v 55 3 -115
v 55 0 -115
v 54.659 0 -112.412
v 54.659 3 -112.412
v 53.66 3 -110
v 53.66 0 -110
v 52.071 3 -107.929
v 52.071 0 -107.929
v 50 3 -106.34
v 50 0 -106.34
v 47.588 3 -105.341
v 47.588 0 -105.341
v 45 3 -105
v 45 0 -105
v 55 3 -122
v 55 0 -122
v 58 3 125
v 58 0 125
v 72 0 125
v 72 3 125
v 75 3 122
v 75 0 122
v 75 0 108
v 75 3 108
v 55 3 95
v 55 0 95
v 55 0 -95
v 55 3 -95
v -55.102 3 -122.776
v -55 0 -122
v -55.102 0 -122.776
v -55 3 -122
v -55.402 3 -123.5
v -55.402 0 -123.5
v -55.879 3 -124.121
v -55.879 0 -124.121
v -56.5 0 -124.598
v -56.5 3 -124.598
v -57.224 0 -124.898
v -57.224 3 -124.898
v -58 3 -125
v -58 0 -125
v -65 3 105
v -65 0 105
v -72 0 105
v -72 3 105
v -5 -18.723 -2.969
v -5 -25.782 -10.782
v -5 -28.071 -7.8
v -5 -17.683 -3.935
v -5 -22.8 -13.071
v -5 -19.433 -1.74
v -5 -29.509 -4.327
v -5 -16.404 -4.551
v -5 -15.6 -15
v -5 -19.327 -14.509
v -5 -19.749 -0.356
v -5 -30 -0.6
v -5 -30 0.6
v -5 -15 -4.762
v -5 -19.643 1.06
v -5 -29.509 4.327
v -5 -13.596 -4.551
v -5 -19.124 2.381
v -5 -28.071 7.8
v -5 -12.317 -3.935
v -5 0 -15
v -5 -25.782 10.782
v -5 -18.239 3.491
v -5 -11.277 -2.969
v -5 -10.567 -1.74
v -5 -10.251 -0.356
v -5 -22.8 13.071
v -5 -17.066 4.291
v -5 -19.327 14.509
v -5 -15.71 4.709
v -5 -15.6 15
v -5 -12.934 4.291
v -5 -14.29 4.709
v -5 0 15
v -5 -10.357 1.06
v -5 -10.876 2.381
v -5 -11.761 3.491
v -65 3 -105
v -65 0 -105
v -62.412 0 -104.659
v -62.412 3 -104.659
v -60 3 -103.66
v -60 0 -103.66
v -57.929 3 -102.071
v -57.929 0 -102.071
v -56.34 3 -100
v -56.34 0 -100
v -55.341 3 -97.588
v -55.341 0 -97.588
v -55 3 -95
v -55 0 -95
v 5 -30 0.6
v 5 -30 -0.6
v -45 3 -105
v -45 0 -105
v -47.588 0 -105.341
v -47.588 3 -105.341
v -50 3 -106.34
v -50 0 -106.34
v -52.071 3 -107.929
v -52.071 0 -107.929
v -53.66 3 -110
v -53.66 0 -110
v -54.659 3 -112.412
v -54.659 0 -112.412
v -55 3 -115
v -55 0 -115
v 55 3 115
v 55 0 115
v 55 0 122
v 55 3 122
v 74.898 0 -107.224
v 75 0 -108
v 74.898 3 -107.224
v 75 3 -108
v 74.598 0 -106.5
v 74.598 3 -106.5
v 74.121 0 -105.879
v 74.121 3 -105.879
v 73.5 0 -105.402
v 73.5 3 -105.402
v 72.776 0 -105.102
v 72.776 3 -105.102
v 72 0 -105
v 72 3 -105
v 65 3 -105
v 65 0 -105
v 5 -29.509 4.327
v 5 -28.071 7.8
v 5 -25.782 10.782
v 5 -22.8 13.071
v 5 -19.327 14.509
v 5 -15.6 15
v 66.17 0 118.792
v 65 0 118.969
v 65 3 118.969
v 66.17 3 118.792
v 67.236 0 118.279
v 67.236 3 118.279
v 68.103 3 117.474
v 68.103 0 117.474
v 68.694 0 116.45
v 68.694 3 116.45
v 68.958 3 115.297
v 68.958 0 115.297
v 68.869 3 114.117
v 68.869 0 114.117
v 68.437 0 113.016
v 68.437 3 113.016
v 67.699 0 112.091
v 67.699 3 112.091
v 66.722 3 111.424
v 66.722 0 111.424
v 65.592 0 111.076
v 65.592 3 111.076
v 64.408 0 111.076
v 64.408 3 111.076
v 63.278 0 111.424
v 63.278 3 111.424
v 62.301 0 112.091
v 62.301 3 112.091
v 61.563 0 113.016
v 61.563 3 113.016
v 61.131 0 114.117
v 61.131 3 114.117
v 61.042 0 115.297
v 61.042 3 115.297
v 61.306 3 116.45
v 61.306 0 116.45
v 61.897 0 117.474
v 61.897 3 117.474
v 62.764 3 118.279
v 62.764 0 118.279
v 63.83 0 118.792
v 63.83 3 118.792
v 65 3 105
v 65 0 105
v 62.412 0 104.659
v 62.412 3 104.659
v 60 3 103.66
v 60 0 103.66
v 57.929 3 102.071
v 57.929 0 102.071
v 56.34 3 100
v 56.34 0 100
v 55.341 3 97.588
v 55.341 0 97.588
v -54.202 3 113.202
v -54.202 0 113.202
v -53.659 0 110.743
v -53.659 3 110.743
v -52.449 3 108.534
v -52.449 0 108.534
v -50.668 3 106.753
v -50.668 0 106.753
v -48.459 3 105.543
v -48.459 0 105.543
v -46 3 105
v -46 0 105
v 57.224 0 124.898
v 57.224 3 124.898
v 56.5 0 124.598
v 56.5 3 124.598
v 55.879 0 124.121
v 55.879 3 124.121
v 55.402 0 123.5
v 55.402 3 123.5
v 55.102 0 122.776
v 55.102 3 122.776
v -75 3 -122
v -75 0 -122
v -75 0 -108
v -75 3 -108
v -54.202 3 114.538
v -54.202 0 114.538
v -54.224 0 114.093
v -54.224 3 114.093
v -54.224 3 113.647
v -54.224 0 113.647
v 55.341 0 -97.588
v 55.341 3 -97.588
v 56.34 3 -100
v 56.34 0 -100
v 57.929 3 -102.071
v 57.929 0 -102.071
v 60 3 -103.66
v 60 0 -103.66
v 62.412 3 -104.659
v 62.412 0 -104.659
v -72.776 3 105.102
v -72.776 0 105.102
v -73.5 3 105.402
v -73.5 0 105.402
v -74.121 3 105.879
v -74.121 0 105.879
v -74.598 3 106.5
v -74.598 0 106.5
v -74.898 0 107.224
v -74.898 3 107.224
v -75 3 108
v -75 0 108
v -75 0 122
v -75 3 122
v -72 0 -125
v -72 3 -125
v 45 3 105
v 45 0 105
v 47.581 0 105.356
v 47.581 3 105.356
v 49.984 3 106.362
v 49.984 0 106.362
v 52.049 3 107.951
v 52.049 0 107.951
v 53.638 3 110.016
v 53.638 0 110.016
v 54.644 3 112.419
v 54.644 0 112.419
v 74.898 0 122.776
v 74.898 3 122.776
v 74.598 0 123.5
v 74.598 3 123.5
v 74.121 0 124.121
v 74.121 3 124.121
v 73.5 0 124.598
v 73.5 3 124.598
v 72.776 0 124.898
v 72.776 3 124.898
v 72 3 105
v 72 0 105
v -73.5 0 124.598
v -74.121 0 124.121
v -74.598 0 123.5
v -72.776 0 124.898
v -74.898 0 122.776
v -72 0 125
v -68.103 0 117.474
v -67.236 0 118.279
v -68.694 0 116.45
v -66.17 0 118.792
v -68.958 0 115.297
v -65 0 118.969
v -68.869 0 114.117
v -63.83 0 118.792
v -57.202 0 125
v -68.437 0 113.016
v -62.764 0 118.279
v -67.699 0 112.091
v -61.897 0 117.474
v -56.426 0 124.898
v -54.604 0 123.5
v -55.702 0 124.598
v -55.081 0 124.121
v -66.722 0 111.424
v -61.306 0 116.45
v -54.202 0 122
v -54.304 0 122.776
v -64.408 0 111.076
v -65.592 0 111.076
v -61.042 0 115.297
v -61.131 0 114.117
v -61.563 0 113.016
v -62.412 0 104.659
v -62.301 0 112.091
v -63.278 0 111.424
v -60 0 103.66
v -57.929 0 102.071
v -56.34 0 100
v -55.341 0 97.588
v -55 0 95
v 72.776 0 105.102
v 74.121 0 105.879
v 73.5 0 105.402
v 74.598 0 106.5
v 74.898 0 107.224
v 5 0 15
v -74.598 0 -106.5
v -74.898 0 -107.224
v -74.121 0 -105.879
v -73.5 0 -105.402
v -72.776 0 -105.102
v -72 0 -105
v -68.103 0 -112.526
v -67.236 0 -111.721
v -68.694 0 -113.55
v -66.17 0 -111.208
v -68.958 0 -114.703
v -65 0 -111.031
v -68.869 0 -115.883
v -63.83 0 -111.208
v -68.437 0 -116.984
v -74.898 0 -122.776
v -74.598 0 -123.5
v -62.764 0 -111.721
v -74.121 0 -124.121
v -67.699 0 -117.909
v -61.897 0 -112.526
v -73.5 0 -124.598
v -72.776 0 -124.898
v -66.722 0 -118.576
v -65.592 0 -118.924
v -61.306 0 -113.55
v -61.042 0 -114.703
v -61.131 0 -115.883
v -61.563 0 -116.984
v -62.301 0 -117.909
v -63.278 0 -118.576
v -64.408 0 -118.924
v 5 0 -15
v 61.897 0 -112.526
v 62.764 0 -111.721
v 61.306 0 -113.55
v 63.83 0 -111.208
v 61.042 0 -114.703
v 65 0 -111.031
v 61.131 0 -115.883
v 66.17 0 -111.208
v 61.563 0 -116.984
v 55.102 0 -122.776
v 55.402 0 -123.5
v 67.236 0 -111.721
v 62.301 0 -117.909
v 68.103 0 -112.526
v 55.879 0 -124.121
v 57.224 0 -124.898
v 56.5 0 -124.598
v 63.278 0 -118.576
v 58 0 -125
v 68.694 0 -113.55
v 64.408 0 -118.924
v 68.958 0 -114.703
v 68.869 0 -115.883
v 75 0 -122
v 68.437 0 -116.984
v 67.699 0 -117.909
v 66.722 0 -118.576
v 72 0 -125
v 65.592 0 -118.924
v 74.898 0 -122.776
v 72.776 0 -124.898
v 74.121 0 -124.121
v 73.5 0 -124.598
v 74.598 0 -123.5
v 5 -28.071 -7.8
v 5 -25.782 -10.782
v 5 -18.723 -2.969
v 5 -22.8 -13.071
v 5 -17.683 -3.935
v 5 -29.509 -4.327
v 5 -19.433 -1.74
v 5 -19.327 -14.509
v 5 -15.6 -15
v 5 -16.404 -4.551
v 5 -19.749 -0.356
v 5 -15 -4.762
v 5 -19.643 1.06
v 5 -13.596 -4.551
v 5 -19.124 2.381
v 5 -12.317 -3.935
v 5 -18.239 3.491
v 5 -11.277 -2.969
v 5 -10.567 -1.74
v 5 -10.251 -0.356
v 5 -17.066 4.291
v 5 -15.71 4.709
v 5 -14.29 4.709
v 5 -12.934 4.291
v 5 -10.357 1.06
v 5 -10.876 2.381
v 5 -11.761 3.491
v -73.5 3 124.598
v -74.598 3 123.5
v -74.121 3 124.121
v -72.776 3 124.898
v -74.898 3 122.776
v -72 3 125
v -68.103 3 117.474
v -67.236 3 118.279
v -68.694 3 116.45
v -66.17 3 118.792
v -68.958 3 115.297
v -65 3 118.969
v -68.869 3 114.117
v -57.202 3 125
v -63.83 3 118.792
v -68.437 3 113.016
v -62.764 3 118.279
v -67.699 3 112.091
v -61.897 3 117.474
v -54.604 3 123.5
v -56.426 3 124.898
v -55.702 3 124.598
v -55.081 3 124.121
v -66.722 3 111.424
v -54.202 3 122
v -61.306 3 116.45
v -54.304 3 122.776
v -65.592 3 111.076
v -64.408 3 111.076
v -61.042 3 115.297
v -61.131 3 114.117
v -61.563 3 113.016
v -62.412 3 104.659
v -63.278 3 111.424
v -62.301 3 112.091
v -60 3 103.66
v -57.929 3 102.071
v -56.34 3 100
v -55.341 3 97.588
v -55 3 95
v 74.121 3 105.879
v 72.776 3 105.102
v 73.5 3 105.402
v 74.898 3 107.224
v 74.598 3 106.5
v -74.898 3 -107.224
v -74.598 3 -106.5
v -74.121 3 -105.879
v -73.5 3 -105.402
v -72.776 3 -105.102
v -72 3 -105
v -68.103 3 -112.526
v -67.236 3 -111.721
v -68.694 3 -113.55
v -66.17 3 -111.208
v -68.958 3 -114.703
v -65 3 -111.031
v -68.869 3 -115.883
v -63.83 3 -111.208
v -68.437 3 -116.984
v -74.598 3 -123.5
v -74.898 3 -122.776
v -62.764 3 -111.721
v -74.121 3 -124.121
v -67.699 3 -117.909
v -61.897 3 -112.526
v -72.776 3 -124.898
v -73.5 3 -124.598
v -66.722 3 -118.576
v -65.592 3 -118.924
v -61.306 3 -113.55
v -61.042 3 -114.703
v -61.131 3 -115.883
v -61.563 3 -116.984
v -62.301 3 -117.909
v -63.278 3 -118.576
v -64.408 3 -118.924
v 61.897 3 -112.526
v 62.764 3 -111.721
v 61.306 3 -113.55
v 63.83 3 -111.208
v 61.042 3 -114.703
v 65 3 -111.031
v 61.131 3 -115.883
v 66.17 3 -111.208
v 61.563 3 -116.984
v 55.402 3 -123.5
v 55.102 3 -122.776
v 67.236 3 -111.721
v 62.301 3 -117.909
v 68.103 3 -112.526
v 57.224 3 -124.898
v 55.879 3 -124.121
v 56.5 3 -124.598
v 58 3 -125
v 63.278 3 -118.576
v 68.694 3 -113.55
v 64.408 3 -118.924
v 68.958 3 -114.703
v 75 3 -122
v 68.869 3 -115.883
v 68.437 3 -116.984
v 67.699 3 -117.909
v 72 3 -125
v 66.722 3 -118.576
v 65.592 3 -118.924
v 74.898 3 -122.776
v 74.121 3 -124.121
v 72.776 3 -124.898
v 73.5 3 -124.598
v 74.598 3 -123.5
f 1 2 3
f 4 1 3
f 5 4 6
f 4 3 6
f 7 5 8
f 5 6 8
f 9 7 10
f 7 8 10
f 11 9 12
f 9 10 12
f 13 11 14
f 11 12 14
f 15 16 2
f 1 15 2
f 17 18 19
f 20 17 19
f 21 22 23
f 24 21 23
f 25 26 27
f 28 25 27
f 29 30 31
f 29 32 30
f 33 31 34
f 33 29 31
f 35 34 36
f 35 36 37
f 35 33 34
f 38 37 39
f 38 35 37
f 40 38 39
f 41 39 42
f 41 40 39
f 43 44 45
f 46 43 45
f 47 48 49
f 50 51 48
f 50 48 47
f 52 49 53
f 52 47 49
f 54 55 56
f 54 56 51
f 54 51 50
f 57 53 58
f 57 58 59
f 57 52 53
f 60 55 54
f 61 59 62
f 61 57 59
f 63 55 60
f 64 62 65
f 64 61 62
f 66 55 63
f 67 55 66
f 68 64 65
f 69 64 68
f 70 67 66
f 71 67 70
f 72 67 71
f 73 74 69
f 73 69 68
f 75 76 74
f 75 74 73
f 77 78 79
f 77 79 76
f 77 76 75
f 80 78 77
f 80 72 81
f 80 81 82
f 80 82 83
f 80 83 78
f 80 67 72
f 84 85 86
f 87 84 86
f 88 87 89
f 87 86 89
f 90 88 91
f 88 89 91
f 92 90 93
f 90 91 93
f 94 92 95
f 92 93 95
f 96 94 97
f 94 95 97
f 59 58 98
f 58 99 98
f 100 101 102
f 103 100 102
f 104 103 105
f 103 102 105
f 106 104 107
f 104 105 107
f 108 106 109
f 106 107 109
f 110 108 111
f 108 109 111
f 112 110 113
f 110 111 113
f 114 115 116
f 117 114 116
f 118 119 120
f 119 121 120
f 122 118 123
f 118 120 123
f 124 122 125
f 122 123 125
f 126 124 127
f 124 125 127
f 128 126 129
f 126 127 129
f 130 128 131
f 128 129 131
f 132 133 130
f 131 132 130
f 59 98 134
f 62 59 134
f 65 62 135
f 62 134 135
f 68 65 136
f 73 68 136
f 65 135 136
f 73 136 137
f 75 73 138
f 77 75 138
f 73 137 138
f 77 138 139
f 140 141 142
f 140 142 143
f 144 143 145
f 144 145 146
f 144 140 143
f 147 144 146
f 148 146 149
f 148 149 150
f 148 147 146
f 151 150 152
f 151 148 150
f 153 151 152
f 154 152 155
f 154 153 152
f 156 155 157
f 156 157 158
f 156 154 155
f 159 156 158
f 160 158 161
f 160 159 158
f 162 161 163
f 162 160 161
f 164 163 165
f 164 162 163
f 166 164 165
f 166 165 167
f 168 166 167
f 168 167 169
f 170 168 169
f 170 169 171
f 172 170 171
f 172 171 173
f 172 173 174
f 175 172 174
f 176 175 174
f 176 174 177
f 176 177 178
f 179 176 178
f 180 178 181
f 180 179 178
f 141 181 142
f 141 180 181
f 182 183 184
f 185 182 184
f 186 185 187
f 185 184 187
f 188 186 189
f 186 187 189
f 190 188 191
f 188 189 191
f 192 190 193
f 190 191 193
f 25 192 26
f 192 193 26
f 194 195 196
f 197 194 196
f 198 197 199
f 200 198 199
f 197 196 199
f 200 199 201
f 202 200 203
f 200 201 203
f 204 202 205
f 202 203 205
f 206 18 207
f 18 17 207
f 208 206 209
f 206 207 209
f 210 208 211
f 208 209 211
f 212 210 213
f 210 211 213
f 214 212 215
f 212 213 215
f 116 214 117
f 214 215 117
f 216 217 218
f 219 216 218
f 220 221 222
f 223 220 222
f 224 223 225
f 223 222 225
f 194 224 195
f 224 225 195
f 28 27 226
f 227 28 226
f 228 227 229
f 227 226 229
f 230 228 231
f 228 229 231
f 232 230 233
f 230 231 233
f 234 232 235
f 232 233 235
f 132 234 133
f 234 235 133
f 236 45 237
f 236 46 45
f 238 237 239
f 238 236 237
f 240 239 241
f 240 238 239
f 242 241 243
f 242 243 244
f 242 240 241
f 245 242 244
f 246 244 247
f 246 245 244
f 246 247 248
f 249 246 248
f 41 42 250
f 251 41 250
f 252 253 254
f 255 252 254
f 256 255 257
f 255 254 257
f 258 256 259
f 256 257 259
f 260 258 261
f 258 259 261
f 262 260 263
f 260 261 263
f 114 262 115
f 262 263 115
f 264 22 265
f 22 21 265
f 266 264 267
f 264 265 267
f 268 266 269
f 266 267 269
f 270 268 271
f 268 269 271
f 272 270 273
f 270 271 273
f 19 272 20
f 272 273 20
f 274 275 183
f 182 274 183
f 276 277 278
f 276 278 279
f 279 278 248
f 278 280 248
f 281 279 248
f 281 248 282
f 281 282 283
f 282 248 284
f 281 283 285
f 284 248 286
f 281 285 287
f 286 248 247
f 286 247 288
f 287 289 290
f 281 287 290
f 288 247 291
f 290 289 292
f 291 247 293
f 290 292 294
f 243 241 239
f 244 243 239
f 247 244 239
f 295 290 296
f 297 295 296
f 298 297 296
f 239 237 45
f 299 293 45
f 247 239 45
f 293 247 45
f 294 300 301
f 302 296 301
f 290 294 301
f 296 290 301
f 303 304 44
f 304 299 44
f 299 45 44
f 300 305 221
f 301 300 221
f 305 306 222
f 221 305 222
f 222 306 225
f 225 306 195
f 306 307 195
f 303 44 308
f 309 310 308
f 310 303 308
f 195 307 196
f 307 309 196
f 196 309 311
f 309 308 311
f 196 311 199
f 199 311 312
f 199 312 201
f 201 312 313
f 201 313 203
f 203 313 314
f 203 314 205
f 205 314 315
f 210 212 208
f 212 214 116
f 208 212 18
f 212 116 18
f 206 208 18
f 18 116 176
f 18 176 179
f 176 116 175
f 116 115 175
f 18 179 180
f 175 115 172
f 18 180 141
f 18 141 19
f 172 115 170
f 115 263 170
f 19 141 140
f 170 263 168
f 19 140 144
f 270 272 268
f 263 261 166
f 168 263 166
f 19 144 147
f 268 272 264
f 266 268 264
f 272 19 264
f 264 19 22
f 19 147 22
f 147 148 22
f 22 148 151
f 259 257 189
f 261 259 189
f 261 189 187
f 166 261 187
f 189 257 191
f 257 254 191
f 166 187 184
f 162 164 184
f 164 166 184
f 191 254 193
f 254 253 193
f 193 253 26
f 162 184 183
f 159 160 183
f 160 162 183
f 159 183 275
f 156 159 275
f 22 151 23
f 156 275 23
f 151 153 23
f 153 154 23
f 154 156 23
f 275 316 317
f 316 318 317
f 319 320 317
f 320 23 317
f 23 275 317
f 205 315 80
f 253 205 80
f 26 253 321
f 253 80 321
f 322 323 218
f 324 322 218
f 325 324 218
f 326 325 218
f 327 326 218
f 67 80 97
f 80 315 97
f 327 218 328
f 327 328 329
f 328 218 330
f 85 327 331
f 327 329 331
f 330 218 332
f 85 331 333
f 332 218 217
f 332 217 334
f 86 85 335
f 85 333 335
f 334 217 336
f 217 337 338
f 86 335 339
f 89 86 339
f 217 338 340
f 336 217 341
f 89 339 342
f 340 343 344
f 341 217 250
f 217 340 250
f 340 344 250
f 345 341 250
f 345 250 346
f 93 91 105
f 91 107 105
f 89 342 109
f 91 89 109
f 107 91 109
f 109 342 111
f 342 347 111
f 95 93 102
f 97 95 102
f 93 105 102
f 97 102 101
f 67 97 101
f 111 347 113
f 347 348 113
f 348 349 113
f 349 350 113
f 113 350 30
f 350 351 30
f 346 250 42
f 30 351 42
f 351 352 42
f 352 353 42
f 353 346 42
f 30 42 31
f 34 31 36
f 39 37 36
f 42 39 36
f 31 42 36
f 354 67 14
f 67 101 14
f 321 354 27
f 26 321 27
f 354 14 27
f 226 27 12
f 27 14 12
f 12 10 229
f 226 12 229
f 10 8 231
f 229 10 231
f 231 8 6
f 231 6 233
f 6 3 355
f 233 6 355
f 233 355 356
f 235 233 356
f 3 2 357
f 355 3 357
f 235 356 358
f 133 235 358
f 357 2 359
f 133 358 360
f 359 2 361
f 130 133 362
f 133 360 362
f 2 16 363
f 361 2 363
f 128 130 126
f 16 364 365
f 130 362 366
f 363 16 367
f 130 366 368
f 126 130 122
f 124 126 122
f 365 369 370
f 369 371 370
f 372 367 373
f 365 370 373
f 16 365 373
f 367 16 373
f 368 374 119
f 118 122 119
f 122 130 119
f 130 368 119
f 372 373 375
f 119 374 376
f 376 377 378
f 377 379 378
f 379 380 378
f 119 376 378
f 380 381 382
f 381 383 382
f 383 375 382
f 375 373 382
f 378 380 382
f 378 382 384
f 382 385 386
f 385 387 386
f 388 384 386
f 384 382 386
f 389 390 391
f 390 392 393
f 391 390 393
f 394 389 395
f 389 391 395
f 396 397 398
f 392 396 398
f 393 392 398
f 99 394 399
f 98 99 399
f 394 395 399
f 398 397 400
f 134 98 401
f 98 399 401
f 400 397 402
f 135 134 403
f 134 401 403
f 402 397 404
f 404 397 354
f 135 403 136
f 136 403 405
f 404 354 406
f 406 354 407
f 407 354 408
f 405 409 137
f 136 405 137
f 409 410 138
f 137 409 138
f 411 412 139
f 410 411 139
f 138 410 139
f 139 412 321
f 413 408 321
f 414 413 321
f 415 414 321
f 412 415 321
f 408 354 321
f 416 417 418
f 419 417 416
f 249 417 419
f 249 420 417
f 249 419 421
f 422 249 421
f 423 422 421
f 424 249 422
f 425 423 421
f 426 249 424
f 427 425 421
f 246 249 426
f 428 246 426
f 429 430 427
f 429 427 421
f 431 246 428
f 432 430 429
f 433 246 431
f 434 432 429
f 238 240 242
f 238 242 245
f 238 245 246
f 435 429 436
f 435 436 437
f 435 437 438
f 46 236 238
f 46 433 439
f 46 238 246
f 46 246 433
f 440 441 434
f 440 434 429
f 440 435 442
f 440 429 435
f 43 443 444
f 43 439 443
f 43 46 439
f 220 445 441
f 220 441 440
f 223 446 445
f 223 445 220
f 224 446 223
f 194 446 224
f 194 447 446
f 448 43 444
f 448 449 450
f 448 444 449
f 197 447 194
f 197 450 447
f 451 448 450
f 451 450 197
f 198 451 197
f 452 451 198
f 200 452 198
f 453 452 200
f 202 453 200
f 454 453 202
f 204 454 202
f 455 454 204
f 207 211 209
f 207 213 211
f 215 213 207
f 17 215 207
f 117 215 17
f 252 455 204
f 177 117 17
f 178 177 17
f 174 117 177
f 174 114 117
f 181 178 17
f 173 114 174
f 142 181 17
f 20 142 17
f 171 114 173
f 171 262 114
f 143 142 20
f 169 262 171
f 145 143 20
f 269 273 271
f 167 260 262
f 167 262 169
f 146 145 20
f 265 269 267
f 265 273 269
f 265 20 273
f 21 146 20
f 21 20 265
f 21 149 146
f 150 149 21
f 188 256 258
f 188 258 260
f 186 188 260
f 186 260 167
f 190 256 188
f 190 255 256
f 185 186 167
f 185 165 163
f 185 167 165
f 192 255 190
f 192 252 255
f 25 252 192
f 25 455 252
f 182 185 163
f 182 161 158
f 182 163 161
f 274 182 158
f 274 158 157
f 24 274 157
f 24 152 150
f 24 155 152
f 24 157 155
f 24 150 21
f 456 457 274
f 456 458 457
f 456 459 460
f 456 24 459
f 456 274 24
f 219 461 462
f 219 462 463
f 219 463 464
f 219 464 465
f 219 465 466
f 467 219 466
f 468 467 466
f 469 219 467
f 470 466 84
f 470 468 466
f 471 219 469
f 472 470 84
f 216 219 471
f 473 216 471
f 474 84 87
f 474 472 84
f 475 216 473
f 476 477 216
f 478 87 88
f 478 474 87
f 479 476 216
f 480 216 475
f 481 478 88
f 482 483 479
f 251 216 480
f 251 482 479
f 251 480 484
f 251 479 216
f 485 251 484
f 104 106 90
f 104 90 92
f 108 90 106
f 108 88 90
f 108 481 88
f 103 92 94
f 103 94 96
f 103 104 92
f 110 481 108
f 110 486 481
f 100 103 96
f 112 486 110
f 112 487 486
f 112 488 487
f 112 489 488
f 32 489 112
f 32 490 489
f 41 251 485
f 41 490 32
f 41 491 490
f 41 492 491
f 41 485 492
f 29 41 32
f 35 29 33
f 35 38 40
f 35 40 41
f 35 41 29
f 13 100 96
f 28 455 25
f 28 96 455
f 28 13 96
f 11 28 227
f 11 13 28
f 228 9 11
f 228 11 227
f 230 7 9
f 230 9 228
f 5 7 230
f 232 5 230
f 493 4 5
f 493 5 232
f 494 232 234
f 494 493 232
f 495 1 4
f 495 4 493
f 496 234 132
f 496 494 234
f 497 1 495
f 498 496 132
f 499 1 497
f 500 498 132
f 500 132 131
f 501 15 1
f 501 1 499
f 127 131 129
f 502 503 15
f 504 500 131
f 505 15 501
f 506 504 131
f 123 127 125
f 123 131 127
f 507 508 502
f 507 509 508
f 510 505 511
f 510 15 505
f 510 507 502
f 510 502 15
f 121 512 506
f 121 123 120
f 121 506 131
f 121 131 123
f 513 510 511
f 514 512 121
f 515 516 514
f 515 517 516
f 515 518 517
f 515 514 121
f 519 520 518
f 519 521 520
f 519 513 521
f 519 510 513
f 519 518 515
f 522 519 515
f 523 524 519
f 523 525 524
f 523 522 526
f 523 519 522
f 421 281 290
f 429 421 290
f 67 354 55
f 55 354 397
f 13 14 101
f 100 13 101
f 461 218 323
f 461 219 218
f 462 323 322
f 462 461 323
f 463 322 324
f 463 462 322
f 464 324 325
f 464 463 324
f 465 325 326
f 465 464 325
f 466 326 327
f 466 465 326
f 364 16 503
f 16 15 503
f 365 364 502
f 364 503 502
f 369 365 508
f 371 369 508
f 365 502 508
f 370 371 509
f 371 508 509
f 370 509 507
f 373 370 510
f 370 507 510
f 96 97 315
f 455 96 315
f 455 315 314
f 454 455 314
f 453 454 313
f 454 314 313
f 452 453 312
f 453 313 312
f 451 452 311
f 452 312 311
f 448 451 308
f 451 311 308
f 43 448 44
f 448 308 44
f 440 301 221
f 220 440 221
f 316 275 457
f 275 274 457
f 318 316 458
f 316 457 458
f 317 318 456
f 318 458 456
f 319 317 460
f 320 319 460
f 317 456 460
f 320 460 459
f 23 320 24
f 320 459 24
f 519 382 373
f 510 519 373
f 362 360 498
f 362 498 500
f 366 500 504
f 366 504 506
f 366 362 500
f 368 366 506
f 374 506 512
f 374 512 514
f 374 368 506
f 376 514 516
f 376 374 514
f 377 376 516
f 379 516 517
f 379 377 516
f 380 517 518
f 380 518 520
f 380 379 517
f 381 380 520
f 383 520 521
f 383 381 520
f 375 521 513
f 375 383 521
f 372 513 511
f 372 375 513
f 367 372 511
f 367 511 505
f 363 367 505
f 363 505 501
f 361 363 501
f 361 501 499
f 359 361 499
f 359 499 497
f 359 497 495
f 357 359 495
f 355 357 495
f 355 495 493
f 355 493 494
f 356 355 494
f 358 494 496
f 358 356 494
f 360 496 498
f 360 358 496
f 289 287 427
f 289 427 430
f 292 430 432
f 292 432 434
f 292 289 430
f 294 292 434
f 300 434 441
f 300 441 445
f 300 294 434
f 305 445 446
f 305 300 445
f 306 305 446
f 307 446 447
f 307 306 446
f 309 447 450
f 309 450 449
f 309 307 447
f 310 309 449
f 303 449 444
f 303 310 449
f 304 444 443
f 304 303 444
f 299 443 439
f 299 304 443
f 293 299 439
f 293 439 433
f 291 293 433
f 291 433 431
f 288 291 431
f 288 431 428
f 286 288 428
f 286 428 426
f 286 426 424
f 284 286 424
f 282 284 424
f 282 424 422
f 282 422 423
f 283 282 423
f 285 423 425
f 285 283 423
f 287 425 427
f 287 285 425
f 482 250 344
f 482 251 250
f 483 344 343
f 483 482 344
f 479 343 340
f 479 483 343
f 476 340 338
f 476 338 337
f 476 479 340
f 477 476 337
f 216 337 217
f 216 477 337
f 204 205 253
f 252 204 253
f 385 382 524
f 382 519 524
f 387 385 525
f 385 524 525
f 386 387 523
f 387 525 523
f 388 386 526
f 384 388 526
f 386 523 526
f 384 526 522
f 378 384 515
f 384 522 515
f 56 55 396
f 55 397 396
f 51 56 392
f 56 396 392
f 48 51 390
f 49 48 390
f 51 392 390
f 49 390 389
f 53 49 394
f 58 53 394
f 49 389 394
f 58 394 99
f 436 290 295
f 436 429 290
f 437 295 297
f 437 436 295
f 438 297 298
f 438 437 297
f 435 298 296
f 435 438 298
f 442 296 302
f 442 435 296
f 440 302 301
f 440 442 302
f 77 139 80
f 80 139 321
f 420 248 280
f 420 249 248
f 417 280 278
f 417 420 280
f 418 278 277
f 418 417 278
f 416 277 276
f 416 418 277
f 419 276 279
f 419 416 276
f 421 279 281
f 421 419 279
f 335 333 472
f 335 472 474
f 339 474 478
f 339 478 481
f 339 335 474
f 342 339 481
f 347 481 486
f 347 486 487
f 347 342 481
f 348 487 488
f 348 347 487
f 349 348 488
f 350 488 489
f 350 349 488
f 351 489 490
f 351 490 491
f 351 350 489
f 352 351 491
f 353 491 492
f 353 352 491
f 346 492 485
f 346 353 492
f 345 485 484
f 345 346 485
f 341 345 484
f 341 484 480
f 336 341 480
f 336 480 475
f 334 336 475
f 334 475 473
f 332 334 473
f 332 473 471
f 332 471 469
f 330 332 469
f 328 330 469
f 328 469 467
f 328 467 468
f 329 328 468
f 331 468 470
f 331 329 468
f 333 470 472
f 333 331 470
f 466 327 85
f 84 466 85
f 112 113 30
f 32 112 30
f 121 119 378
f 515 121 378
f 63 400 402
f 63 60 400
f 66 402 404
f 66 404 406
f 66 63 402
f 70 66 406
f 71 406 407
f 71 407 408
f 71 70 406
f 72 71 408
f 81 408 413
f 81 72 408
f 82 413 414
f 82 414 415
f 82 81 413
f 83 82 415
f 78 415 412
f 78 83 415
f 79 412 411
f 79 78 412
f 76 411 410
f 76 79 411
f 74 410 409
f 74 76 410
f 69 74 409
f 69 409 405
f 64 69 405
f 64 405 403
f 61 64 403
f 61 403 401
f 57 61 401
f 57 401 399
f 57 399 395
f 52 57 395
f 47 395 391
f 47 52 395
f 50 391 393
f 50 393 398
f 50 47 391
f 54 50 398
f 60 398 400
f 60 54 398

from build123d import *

# Parameters (mm, degrees)
SKETCH1_R           = 3.96875
BOSS_EXTRUDE1_DEPTH = 3
FILLET1_R           = 3
SKETCH9_R           = 4.7625
BOSS_EXTRUDE3_DEPTH = 5


with BuildPart() as part:
    # Sketch1 → Boss-Extrude1 (new body)
    with BuildSketch(Plane(origin=(0, 0, 0), x_dir=(1, 0, 0), z_dir=(0, 1, 0))):
        with BuildLine():
            Line((45, 105), (-45, 105))
            ThreePointArc((-45, 105), (-52.071067812, 107.928932188), (-55, 115))
            Line((-55, 115), (-55, 125))
            Line((-55, 125), (-75, 125))
            Line((-75, 125), (-75, 105))
            Line((-75, 105), (-65, 105))
            ThreePointArc((-65, 105), (-57.928932188, 102.071067812), (-55, 95))
            Line((-55, 95), (-55, -95))
            ThreePointArc((-55, -95), (-57.928932188, -102.071067812), (-65, -105))
            Line((-65, -105), (-75, -105))
            Line((-75, -105), (-75, -125))
            Line((-75, -125), (-54.202059137, -125))
            Line((-54.202059137, -125), (-54.202059137, -114.538060718))
            ThreePointArc((-54.202059137, -114.538060718), (-54.227177014, -113.870059928), (-54.202059137, -113.202059137))
            ThreePointArc((-54.202059137, -113.202059137), (-51.621839755, -107.580219382), (-46, -105))
            Line((-46, -105), (45, -105))
            ThreePointArc((45, -105), (52.04921496, -107.95078504), (55, -115))
            Line((55, -115), (55, -125))
            Line((55, -125), (75, -125))
            Line((75, -125), (75, -105))
            Line((75, -105), (65, -105))
            ThreePointArc((65, -105), (57.928932188, -102.071067812), (55, -95))
            Line((55, -95), (55, 95))
            ThreePointArc((55, 95), (57.928932188, 102.071067812), (65, 105))
            Line((65, 105), (75, 105))
            Line((75, 105), (75, 125))
            Line((75, 125), (55, 125))
            Line((55, 125), (55, 115))
            ThreePointArc((55, 115), (52.071067812, 107.928932188), (45, 105))
        make_face()
        with Locations(Location((-65, -115, 0), (0, 0, 270))):
            Circle(SKETCH1_R, mode=Mode.SUBTRACT)
        with Locations(Location((65, -115, 0), (0, 0, 270))):
            Circle(SKETCH1_R, mode=Mode.SUBTRACT)
        with Locations(Location((-65, 115, 0), (0, 0, 270))):
            Circle(SKETCH1_R, mode=Mode.SUBTRACT)
        with Locations(Location((65, 115, 0), (0, 0, 270))):
            Circle(SKETCH1_R, mode=Mode.SUBTRACT)
    extrude(amount=BOSS_EXTRUDE1_DEPTH)

    # Fillet1
    fillet1_edges = [part.edges().sort_by_distance(p)[0] for p in [
        (55, 1.5, -125),
        (75, 1.5, -125),
        (75, 1.5, -105),
        (75, 1.5, 105),
        (75, 1.5, 125),
        (55, 1.5, 125),
        (-54.202059137, 1.5, 125),
        (-75, 1.5, 125),
        (-75, 1.5, 105),
        (-75, 1.5, -105),
        (-75, 1.5, -125),
        (-55, 1.5, -125),
    ]]
    fillet(fillet1_edges, radius=FILLET1_R)

    # Sketch9 → Boss-Extrude3 (add, symmetric)
    with BuildSketch(Plane(origin=(0, 0, 0), x_dir=(0, 0, -1), z_dir=(1, 0, 0))):
        with BuildLine():
            Line((-15, 0), (15, 0))
            Line((15, 0), (15, -15.6))
            ThreePointArc((15, -15.6), (10.782337649, -25.782337649), (0.6, -30))
            Line((0.6, -30), (-0.6, -30))
            ThreePointArc((-0.6, -30), (-10.782337649, -25.782337649), (-15, -15.6))
            Line((-15, -15.6), (-15, 0))
        make_face()
        with Locations((0, -15)):
            Circle(SKETCH9_R, mode=Mode.SUBTRACT)
    extrude(amount=BOSS_EXTRUDE3_DEPTH, both=True)


solid = part.part
